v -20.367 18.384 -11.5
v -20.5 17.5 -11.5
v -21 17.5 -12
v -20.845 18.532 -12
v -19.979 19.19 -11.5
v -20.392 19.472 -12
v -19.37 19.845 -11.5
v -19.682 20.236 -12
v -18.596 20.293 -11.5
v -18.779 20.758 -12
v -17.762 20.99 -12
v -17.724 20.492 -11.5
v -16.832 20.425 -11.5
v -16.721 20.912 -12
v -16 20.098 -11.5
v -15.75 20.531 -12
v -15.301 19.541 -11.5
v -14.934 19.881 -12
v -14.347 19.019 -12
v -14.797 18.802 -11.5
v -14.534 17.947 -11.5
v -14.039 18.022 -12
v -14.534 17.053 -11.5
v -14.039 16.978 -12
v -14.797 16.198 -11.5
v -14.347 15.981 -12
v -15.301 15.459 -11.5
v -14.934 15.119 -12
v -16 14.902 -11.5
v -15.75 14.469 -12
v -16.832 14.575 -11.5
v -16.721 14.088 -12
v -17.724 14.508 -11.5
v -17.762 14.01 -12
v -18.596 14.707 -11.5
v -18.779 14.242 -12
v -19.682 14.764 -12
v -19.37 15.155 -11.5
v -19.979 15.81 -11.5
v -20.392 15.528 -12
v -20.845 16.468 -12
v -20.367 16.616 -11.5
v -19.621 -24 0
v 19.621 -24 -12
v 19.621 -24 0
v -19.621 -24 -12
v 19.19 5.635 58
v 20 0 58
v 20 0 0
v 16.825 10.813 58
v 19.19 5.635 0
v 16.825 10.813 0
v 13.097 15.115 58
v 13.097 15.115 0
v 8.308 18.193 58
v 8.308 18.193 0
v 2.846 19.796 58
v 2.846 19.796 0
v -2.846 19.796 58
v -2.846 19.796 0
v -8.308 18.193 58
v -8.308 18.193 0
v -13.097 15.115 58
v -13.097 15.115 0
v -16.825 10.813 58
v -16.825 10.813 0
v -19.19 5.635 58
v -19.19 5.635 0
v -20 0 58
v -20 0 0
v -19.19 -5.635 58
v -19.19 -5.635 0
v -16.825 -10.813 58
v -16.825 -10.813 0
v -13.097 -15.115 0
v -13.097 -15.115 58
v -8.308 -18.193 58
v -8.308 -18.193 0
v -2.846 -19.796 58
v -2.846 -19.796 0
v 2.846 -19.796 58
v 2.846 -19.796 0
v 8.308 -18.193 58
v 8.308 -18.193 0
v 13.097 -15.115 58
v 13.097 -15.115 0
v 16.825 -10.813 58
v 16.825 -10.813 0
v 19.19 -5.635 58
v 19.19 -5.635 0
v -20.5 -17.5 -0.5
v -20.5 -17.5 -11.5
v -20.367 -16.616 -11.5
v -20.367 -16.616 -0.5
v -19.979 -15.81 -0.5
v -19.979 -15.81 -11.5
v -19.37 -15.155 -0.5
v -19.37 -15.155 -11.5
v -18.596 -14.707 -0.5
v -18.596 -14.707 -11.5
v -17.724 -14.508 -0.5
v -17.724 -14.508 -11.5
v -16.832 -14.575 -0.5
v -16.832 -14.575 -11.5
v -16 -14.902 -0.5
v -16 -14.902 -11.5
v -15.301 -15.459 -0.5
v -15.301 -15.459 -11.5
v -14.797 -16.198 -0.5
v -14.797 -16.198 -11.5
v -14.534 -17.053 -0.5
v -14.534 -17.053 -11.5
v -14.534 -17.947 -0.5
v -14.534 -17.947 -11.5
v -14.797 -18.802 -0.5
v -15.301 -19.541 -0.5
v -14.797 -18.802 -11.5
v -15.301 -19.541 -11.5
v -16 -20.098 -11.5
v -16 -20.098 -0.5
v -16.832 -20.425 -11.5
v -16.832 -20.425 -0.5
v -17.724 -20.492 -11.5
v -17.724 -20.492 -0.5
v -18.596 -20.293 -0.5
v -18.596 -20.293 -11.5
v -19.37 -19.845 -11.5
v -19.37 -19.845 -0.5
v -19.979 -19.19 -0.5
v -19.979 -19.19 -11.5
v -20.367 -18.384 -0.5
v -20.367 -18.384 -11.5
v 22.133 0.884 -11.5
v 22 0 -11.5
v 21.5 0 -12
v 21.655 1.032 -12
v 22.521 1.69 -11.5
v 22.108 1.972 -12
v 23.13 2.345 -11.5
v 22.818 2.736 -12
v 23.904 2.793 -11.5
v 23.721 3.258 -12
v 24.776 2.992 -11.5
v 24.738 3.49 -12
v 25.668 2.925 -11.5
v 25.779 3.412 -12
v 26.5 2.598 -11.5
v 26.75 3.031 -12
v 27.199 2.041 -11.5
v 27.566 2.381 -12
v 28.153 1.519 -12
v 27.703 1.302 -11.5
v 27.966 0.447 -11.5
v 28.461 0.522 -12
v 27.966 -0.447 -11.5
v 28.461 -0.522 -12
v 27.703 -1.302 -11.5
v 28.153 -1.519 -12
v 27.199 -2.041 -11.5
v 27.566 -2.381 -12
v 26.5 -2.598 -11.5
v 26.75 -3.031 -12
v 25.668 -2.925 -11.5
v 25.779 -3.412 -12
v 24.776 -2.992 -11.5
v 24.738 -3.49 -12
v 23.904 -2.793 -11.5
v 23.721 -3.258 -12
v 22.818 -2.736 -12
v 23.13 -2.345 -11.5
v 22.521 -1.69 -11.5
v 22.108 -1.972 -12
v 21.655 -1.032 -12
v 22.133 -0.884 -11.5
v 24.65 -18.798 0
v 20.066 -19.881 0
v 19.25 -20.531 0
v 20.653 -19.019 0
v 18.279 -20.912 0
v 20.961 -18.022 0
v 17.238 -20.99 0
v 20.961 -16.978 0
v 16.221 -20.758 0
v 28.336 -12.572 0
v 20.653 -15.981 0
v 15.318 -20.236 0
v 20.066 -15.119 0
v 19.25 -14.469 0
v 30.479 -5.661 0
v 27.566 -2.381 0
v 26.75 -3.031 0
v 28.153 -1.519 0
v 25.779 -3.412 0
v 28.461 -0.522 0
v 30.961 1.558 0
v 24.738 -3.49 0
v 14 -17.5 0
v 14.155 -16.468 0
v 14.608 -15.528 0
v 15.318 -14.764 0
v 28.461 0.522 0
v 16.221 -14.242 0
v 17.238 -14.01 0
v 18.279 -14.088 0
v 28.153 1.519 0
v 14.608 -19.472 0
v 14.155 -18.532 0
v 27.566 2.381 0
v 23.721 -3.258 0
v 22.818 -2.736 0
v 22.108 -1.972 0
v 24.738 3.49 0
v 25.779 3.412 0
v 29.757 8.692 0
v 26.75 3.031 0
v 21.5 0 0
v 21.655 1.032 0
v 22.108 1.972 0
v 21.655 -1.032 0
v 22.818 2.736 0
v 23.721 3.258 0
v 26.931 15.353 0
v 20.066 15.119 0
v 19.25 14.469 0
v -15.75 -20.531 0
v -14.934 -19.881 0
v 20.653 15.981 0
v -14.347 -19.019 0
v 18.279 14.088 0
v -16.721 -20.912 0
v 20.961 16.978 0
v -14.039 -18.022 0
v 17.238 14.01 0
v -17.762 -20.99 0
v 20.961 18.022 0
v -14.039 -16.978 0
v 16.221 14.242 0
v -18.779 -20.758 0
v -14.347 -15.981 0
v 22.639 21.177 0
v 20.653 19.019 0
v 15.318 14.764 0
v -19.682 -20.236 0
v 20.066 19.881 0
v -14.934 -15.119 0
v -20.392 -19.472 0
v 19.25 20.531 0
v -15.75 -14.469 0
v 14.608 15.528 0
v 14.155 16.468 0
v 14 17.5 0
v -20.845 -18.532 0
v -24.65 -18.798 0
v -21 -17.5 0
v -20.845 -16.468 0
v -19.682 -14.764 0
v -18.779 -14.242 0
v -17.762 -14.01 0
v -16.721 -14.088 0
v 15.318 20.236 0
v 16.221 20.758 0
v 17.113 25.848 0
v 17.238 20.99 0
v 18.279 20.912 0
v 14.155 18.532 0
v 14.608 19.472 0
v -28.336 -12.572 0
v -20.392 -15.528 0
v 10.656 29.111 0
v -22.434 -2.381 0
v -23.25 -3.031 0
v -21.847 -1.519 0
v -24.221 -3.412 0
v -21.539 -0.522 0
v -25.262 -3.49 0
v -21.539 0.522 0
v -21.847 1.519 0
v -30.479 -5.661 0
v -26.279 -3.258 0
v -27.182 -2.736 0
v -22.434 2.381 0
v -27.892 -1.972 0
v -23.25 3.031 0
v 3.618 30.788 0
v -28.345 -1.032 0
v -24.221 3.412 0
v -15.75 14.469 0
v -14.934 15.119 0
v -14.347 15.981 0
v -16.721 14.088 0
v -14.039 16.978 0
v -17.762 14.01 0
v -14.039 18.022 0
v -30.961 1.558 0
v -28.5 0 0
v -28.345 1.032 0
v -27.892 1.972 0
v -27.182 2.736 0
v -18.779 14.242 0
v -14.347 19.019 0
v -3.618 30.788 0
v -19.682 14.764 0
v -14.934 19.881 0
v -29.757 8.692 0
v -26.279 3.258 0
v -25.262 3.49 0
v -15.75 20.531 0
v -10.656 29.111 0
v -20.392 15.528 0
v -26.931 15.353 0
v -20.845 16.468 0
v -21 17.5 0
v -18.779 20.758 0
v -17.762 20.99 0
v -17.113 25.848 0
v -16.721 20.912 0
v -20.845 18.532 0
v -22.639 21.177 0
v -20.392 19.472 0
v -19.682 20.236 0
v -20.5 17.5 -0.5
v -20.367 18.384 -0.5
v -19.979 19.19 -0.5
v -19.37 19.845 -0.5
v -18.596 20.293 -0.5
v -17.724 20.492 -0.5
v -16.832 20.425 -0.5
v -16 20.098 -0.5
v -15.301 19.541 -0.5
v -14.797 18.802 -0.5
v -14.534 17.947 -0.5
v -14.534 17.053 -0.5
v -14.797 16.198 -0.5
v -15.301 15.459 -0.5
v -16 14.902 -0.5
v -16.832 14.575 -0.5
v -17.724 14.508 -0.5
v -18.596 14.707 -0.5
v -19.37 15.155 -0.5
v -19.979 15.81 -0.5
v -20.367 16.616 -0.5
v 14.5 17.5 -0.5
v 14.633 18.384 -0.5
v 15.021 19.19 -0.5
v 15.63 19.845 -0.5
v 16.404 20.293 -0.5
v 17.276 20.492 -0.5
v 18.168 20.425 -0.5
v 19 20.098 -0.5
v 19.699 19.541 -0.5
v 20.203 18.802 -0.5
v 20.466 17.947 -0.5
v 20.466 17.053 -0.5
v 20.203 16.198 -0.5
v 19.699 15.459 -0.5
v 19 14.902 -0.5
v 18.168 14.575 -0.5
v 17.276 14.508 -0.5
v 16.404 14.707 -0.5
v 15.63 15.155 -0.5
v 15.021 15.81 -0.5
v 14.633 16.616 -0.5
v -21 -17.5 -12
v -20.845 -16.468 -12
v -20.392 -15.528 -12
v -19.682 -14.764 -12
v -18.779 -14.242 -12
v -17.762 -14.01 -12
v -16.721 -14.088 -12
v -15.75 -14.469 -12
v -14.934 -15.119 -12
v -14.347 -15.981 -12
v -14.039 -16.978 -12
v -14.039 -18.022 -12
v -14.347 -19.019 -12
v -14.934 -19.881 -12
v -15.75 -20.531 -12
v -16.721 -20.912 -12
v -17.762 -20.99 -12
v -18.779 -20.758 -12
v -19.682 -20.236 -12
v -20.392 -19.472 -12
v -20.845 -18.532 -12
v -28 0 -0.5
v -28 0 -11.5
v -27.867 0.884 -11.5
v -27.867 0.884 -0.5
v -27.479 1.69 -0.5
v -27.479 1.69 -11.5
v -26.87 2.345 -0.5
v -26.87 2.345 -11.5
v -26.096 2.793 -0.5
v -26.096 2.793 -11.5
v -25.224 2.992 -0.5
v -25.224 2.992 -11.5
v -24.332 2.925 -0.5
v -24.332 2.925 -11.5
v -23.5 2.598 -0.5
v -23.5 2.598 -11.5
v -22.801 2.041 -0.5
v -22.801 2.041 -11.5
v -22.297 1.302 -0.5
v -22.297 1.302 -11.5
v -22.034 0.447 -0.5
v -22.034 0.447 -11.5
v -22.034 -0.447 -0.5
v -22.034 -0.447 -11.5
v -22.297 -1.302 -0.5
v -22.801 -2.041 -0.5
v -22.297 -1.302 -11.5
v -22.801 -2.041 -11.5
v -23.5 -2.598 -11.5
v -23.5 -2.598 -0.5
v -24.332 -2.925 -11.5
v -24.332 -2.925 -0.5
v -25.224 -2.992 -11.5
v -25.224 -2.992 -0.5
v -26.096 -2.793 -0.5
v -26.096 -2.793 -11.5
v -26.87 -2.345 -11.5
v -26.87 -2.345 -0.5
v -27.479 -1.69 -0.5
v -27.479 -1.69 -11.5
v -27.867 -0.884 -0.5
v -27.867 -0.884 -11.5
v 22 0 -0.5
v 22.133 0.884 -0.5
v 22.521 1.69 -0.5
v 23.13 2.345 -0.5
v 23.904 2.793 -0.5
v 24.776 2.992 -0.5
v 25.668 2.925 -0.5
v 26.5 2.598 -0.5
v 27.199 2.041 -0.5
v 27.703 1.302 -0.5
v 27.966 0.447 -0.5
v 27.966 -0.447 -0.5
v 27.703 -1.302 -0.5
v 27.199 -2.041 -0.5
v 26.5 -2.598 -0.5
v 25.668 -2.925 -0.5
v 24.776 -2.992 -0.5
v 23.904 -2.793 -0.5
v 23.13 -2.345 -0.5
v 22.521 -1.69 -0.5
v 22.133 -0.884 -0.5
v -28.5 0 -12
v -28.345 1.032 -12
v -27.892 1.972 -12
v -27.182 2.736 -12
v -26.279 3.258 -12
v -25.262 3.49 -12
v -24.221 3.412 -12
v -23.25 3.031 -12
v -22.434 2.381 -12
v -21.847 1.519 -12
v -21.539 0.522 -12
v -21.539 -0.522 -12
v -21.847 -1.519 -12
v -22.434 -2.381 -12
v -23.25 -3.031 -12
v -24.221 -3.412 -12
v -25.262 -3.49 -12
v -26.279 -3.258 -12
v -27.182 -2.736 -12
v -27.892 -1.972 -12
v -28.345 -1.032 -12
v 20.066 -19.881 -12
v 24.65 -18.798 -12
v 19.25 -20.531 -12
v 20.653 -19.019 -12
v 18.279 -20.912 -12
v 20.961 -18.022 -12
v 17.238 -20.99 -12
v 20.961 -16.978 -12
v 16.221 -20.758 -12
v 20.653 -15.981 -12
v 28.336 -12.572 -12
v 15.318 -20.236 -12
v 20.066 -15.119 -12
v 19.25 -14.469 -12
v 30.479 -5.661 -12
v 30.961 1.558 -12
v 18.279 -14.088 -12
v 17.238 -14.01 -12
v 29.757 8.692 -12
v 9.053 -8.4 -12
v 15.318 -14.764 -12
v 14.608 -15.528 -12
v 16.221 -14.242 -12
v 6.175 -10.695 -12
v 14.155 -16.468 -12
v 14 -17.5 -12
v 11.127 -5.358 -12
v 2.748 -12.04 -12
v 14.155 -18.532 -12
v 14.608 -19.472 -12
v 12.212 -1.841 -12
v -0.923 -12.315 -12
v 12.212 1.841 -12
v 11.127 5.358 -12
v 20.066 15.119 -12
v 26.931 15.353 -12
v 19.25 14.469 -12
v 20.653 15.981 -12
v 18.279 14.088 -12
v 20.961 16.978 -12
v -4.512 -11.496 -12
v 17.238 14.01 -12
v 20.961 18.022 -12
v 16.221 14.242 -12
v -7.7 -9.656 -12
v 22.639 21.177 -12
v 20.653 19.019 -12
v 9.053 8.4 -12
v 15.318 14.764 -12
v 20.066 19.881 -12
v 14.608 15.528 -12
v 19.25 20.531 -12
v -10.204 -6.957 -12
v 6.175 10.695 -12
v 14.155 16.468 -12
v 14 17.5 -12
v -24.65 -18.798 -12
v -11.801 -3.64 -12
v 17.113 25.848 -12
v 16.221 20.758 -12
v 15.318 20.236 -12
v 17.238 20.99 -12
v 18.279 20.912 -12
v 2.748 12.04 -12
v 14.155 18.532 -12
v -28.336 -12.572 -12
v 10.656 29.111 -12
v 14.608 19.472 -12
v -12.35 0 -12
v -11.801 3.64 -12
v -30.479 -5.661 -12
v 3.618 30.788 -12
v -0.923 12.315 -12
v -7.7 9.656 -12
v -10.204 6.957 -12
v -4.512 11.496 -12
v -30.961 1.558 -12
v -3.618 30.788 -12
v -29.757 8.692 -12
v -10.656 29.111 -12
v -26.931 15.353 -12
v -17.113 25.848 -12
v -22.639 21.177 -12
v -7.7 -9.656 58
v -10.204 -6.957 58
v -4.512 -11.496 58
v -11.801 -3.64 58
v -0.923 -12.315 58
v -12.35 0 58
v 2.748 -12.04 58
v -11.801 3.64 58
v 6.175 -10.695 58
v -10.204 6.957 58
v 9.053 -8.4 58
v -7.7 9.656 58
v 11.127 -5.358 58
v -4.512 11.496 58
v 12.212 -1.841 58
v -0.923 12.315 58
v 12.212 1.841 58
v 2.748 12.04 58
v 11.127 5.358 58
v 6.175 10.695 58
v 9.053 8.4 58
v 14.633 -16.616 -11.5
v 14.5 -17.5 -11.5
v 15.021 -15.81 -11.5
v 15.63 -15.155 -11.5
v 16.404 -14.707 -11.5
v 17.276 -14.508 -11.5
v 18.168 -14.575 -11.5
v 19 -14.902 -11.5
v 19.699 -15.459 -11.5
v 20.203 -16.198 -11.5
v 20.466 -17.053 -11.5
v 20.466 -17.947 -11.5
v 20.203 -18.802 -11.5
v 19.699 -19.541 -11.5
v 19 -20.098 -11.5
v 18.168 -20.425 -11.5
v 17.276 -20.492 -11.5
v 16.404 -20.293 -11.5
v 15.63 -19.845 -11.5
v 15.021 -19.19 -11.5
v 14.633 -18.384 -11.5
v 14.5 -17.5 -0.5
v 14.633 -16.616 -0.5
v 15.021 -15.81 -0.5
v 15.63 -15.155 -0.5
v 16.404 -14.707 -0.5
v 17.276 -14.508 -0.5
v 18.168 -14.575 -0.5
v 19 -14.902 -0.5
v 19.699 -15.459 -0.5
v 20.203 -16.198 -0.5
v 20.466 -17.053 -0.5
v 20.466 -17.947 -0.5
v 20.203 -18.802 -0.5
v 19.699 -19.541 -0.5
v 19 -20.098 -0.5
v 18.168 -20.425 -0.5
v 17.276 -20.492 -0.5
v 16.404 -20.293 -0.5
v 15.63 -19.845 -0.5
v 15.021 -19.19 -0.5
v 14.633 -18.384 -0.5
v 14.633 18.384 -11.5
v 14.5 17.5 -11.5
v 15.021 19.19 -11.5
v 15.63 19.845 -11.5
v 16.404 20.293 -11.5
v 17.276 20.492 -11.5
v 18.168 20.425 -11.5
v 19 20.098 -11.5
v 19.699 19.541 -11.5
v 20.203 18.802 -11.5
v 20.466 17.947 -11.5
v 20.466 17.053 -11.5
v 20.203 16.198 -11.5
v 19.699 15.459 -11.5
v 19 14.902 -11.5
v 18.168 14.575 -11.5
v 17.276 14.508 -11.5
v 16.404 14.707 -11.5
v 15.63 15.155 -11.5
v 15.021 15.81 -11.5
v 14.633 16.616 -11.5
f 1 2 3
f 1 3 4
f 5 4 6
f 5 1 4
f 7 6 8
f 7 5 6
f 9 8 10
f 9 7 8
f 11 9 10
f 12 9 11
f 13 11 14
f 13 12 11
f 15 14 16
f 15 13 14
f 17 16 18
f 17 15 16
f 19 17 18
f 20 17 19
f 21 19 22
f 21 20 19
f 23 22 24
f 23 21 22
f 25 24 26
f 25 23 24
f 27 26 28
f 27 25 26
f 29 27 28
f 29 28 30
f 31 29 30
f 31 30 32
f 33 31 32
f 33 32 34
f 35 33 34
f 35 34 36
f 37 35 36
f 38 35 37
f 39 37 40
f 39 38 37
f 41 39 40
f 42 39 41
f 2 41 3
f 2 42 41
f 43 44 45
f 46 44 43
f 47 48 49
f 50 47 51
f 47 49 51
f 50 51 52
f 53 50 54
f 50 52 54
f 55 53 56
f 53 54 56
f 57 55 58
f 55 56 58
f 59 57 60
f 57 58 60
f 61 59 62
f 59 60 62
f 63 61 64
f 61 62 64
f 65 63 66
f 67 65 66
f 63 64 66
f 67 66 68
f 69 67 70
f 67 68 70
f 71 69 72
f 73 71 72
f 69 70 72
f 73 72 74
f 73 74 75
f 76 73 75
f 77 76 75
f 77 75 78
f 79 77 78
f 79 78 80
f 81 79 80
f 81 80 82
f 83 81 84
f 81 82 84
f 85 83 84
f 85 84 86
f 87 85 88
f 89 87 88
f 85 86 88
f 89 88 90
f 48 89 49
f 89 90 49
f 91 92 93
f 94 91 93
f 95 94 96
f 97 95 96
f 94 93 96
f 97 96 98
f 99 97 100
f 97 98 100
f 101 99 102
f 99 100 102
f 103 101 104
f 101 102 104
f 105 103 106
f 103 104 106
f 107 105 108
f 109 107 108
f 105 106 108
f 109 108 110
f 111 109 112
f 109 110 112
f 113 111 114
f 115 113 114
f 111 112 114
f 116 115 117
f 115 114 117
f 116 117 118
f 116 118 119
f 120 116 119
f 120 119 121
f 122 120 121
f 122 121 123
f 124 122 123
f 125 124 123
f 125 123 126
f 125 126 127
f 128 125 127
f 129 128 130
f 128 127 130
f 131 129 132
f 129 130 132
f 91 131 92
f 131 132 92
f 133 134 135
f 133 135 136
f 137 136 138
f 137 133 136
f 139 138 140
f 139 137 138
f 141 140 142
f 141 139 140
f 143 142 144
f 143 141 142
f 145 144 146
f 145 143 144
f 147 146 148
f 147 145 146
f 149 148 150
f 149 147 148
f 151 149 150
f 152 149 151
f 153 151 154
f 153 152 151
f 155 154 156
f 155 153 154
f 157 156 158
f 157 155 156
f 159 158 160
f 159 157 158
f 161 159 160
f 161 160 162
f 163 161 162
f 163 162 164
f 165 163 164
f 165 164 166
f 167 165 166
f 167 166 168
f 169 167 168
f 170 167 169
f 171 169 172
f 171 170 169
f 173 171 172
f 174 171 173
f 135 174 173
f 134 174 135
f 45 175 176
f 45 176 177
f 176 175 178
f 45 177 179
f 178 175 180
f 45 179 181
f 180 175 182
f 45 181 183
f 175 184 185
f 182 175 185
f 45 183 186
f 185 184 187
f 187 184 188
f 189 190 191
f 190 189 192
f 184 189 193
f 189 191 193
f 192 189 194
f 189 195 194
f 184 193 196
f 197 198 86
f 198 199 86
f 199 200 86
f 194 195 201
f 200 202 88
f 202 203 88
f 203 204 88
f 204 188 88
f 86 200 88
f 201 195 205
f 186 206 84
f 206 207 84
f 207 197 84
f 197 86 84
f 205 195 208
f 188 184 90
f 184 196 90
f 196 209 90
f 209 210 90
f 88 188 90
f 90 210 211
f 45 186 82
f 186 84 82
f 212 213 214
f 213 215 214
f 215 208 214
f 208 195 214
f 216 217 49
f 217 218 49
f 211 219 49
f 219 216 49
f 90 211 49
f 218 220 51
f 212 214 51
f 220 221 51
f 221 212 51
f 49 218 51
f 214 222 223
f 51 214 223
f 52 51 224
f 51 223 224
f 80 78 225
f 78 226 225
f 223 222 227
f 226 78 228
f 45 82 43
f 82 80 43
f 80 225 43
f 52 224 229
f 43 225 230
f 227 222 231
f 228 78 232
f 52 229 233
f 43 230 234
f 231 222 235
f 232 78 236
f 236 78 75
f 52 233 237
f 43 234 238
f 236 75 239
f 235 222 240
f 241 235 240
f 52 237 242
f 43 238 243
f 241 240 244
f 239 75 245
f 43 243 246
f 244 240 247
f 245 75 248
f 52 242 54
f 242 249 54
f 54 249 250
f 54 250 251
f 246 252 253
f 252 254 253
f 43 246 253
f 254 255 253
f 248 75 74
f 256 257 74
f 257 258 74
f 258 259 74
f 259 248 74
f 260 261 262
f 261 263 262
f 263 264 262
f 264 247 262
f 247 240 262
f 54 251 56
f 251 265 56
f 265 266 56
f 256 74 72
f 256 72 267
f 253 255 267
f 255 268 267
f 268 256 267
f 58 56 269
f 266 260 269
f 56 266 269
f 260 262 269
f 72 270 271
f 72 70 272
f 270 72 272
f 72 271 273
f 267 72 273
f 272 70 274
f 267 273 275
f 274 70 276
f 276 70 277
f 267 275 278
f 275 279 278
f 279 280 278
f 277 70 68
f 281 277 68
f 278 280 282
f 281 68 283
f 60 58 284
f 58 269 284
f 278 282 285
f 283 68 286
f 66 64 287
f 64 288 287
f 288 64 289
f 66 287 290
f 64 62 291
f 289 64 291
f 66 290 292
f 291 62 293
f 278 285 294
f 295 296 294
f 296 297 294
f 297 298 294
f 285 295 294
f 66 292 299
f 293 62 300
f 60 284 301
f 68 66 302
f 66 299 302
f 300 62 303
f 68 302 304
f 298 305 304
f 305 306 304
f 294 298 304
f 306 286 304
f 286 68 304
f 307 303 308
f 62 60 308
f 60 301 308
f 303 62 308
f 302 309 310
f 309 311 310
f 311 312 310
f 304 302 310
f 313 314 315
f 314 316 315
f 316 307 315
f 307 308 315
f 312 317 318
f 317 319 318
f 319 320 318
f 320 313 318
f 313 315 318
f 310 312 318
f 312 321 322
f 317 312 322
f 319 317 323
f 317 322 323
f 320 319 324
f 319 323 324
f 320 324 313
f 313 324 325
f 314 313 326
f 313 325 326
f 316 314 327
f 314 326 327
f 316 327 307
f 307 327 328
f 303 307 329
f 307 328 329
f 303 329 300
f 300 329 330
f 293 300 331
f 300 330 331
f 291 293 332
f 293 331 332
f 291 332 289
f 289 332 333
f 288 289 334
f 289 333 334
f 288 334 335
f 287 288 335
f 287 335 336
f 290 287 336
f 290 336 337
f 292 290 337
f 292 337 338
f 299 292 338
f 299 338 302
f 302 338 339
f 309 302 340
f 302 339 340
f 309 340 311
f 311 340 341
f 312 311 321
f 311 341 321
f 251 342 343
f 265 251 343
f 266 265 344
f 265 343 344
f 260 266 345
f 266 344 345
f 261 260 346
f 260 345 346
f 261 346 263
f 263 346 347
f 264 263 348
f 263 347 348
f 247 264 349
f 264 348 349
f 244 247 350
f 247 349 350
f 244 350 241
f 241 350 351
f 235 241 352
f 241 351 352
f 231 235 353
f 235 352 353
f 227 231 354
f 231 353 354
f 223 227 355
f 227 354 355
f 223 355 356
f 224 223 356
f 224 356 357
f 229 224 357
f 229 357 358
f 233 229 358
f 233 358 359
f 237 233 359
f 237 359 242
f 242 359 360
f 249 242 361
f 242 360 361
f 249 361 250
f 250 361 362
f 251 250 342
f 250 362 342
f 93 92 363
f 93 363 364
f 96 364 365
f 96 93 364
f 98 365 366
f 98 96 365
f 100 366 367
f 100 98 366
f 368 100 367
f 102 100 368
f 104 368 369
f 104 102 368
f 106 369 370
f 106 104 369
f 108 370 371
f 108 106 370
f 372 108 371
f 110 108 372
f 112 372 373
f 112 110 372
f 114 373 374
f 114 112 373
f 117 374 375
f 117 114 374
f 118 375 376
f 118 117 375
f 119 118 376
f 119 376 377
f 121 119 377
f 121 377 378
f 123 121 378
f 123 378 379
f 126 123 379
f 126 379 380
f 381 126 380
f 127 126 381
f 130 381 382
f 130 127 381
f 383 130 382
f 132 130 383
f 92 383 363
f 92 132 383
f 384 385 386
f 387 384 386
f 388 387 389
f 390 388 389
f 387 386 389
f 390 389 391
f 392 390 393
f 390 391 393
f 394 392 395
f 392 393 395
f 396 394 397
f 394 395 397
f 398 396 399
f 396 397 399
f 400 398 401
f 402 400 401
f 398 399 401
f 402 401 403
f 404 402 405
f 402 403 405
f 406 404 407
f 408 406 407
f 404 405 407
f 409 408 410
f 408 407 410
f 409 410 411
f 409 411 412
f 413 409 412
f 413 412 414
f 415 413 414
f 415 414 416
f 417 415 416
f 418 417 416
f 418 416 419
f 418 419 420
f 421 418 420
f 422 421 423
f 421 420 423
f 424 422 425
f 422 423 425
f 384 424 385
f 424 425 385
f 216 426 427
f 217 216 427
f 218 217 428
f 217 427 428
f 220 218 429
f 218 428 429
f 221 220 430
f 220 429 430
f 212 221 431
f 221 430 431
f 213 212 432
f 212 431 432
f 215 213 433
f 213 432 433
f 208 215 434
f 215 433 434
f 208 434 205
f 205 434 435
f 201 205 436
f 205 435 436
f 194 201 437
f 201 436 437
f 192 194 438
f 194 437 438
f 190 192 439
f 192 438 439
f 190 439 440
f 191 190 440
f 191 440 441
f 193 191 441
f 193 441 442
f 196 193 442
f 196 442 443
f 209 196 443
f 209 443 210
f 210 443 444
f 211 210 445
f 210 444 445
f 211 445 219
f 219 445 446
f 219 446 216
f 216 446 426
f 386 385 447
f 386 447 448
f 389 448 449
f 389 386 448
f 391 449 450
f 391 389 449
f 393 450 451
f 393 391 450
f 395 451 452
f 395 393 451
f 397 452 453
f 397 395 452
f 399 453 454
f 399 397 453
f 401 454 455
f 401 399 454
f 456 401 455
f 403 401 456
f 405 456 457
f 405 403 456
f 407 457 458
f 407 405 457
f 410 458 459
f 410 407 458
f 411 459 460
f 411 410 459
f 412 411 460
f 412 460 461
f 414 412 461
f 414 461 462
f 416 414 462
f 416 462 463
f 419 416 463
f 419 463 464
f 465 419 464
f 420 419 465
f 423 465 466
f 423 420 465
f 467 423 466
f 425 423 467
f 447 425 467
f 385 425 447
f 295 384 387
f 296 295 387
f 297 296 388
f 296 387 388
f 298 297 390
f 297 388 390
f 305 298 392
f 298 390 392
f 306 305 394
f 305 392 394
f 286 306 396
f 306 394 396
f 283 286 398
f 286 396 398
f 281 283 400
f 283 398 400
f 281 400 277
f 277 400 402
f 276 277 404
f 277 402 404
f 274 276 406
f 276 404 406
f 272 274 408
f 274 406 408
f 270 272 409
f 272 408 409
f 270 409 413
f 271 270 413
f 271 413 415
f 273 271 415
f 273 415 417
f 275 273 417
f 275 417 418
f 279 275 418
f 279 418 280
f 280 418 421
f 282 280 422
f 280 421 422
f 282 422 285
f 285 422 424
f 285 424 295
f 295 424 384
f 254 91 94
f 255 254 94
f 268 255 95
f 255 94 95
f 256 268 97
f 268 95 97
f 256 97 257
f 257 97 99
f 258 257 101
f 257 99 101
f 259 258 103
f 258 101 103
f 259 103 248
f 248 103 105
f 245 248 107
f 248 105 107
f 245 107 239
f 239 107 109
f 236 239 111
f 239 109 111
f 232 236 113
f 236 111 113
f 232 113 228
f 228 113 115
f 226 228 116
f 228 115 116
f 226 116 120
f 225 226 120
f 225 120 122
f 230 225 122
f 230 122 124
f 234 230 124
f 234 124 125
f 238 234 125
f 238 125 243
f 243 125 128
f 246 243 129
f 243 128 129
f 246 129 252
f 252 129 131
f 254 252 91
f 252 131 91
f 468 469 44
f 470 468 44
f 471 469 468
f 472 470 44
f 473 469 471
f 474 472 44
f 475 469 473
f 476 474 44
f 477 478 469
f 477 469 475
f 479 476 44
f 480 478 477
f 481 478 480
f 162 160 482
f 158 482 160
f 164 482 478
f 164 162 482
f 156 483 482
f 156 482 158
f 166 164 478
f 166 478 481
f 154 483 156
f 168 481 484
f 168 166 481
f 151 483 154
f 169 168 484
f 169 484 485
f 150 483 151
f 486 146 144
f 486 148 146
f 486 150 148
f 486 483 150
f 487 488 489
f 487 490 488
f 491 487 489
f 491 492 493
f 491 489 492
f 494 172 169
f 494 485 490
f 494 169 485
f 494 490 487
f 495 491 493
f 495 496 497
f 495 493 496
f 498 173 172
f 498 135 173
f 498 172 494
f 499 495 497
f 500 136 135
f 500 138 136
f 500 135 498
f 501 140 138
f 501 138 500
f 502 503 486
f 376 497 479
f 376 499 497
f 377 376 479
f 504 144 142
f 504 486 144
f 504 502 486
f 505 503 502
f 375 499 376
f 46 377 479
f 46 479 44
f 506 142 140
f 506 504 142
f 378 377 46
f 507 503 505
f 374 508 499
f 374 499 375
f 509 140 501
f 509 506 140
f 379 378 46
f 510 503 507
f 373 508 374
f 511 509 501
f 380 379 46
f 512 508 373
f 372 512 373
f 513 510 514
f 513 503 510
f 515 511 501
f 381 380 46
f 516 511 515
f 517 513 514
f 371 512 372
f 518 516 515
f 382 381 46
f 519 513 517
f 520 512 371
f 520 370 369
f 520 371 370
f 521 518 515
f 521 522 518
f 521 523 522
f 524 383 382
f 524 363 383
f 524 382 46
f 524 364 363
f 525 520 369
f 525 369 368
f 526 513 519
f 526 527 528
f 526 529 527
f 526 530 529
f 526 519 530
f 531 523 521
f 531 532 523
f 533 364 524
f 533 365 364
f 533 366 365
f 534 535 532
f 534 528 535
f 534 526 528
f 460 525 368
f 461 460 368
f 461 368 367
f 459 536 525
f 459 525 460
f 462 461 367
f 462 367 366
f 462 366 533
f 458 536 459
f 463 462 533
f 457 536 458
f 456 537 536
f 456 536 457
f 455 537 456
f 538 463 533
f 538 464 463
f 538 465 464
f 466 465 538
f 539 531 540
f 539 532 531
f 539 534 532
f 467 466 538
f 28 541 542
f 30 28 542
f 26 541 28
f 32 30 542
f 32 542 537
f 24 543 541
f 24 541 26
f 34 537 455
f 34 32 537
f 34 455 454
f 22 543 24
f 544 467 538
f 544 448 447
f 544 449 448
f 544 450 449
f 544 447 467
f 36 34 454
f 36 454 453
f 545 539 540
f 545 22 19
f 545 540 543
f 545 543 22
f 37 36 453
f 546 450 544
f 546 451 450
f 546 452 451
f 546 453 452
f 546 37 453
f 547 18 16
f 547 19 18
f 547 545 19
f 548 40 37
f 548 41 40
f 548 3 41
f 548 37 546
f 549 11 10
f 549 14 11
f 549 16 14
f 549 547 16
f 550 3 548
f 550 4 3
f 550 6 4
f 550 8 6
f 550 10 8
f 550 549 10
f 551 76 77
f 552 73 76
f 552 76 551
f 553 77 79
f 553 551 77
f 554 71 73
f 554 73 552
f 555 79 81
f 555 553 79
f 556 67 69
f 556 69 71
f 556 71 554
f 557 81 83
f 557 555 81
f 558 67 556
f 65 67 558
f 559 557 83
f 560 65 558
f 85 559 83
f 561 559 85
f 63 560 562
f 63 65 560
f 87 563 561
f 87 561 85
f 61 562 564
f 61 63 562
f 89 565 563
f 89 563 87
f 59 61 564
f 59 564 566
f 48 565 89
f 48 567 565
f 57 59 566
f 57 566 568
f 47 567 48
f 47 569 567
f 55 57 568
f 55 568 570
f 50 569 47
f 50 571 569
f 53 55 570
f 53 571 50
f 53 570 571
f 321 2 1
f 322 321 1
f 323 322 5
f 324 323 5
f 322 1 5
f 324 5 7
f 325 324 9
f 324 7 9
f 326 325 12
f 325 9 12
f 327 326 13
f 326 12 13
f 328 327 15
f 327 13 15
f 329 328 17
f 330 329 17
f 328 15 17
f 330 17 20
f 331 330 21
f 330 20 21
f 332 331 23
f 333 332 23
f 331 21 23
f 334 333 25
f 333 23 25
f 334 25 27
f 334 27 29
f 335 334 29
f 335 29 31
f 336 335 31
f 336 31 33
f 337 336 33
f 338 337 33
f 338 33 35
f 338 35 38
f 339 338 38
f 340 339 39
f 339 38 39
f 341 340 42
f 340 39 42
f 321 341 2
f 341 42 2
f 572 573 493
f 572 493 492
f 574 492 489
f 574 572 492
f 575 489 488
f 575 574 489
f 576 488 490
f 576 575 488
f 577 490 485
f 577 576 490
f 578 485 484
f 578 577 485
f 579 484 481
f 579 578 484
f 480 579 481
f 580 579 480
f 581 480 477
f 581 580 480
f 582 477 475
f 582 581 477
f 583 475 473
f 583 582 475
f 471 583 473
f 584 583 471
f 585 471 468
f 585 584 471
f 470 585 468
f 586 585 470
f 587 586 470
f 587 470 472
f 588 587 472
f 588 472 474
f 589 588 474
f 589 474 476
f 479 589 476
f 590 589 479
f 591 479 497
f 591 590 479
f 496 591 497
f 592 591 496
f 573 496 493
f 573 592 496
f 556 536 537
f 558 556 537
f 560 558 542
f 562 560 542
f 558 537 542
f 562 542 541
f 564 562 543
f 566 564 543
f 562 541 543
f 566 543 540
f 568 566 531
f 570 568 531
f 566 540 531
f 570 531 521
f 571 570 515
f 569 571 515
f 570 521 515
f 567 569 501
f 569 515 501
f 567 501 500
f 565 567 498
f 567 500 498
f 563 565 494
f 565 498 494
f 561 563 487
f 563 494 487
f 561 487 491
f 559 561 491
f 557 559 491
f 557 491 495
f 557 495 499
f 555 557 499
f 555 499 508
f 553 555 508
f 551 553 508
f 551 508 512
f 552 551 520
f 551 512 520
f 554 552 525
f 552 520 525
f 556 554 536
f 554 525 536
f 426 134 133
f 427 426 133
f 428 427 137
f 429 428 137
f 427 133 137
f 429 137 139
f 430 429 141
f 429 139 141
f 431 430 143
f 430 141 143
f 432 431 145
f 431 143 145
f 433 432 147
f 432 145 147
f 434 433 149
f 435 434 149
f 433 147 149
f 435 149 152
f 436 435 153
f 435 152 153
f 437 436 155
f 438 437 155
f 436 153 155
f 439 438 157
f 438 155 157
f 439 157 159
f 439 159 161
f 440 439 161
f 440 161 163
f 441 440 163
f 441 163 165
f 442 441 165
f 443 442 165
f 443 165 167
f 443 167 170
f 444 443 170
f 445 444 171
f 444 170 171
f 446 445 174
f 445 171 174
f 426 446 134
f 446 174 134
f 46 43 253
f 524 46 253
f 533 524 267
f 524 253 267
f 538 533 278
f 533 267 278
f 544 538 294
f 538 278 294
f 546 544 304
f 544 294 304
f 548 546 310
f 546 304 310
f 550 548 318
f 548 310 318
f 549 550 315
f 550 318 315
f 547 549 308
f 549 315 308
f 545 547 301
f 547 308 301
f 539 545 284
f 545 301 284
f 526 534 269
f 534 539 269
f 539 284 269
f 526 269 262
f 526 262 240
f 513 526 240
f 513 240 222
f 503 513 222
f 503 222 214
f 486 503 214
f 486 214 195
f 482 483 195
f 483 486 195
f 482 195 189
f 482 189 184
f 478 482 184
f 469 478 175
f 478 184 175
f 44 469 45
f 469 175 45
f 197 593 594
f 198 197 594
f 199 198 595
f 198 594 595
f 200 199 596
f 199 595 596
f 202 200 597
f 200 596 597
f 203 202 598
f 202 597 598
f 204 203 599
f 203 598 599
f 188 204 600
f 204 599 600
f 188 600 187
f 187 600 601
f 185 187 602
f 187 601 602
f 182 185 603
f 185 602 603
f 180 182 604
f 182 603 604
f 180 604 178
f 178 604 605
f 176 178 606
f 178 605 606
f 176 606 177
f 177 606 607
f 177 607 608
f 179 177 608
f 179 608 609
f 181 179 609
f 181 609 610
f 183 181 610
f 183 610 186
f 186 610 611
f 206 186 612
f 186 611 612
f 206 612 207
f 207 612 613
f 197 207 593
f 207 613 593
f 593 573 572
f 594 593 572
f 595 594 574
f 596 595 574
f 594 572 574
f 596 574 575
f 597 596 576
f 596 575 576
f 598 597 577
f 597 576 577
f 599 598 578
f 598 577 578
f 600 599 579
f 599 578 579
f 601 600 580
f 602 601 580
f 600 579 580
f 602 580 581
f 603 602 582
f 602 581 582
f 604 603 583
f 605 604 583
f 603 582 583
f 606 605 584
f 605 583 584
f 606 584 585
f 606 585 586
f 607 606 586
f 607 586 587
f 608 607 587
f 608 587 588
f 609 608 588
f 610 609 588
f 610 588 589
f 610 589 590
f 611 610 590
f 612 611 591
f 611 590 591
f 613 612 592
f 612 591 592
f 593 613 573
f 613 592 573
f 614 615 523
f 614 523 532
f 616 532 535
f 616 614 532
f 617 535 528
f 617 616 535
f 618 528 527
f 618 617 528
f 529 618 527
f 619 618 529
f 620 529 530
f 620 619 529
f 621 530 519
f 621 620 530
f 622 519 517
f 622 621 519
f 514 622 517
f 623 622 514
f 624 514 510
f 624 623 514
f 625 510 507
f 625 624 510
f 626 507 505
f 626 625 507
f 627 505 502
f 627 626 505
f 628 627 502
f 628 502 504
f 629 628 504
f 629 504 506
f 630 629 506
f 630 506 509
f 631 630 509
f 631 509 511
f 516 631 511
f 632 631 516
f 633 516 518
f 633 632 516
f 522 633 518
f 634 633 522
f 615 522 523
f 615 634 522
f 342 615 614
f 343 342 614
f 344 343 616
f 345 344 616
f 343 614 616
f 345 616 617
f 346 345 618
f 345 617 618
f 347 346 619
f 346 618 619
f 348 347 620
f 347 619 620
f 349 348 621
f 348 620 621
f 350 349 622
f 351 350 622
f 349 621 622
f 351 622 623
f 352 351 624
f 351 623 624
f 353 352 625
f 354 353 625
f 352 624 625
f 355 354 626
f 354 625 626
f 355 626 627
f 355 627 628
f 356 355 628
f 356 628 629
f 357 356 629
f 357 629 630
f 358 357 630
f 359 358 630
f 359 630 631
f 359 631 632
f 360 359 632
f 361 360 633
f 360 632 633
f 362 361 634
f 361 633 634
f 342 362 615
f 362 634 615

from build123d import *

# Parameters (mm, degrees)
SZKIC1_R                    = 20
DODANIE_WYCI_GNI_CIE1_DEPTH = 58
SZKIC3_R                    = 31
DODANIE_WYCI_GNI_CIE2_DEPTH = 12
SZKIC4_W                    = 39.24283374
SZKIC4_H                    = 7
WYTNIJ_WYCI_GNI_CIE1_DEPTH  = 12
SZKIC5_R                    = 12.35
WYTNIJ_WYCI_GNI_CIE2_DEPTH  = 70
SZKIC6_R                    = 3
WYTNIJ_WYCI_GNI_CIE3_DEPTH  = 12
SFAZOWANIE1_SIZE            = 0.5


with BuildPart() as part:
    # Szkic1 → Dodanie-wyciągnięcie1 (new body)
    with BuildSketch(Plane.XY):
        Circle(SZKIC1_R)
    extrude(amount=DODANIE_WYCI_GNI_CIE1_DEPTH)

    # Szkic3 → Dodanie-wyciągnięcie2 (add)
    with BuildSketch(Plane(origin=(0, 0, 0), x_dir=(-1, 0, 0), z_dir=(0, 0, -1))):
        Circle(SZKIC3_R)
    extrude(amount=DODANIE_WYCI_GNI_CIE2_DEPTH)

    # Szkic4 → Wytnij-wyciągnięcie1 (cut)
    with BuildSketch(Plane(origin=(0, 0, -12), x_dir=(-1, 0, 0), z_dir=(0, 0, -1))):
        with Locations((0, -27.5)):
            Rectangle(SZKIC4_W, SZKIC4_H)
    extrude(amount=-WYTNIJ_WYCI_GNI_CIE1_DEPTH, mode=Mode.SUBTRACT)

    # Szkic5 → Wytnij-wyciągnięcie2 (cut)
    with BuildSketch(Plane(origin=(0, 0, -12), x_dir=(-1, 0, 0), z_dir=(0, 0, -1))):
        Circle(SZKIC5_R)
    extrude(amount=-WYTNIJ_WYCI_GNI_CIE2_DEPTH, mode=Mode.SUBTRACT)

    # Szkic6 → Wytnij-wyciągnięcie3 (cut)
    with BuildSketch(Plane(origin=(0, 0, -12), x_dir=(-1, 0, 0), z_dir=(0, 0, -1))):
        with Locations((-17.5, 17.5)):
            Circle(SZKIC6_R)
        with Locations((-25, 0)):
            Circle(SZKIC6_R)
        with Locations((-17.5, -17.5)):
            Circle(SZKIC6_R)
        with Locations((17.5, -17.5)):
            Circle(SZKIC6_R)
        with Locations((25, 0)):
            Circle(SZKIC6_R)
        with Locations((17.5, 17.5)):
            Circle(SZKIC6_R)
    extrude(amount=-WYTNIJ_WYCI_GNI_CIE3_DEPTH, mode=Mode.SUBTRACT)

    # Sfazowanie1
    sfazowanie1_edges = [part.edges().sort_by_distance(p)[0] for p in [
        (-14.5, 17.5, 0),
        (-14.5, 17.5, -12),
        (-22, 0, 0),
        (-22, 0, -12),
        (-14.5, -17.5, 0),
        (-14.5, -17.5, -12),
        (28, 0, 0),
        (28, 0, -12),
        (20.5, -17.5, 0),
        (20.5, -17.5, -12),
        (20.5, 17.5, 0),
        (20.5, 17.5, -12),
    ]]
    chamfer(sfazowanie1_edges, length=SFAZOWANIE1_SIZE)


solid = part.part
